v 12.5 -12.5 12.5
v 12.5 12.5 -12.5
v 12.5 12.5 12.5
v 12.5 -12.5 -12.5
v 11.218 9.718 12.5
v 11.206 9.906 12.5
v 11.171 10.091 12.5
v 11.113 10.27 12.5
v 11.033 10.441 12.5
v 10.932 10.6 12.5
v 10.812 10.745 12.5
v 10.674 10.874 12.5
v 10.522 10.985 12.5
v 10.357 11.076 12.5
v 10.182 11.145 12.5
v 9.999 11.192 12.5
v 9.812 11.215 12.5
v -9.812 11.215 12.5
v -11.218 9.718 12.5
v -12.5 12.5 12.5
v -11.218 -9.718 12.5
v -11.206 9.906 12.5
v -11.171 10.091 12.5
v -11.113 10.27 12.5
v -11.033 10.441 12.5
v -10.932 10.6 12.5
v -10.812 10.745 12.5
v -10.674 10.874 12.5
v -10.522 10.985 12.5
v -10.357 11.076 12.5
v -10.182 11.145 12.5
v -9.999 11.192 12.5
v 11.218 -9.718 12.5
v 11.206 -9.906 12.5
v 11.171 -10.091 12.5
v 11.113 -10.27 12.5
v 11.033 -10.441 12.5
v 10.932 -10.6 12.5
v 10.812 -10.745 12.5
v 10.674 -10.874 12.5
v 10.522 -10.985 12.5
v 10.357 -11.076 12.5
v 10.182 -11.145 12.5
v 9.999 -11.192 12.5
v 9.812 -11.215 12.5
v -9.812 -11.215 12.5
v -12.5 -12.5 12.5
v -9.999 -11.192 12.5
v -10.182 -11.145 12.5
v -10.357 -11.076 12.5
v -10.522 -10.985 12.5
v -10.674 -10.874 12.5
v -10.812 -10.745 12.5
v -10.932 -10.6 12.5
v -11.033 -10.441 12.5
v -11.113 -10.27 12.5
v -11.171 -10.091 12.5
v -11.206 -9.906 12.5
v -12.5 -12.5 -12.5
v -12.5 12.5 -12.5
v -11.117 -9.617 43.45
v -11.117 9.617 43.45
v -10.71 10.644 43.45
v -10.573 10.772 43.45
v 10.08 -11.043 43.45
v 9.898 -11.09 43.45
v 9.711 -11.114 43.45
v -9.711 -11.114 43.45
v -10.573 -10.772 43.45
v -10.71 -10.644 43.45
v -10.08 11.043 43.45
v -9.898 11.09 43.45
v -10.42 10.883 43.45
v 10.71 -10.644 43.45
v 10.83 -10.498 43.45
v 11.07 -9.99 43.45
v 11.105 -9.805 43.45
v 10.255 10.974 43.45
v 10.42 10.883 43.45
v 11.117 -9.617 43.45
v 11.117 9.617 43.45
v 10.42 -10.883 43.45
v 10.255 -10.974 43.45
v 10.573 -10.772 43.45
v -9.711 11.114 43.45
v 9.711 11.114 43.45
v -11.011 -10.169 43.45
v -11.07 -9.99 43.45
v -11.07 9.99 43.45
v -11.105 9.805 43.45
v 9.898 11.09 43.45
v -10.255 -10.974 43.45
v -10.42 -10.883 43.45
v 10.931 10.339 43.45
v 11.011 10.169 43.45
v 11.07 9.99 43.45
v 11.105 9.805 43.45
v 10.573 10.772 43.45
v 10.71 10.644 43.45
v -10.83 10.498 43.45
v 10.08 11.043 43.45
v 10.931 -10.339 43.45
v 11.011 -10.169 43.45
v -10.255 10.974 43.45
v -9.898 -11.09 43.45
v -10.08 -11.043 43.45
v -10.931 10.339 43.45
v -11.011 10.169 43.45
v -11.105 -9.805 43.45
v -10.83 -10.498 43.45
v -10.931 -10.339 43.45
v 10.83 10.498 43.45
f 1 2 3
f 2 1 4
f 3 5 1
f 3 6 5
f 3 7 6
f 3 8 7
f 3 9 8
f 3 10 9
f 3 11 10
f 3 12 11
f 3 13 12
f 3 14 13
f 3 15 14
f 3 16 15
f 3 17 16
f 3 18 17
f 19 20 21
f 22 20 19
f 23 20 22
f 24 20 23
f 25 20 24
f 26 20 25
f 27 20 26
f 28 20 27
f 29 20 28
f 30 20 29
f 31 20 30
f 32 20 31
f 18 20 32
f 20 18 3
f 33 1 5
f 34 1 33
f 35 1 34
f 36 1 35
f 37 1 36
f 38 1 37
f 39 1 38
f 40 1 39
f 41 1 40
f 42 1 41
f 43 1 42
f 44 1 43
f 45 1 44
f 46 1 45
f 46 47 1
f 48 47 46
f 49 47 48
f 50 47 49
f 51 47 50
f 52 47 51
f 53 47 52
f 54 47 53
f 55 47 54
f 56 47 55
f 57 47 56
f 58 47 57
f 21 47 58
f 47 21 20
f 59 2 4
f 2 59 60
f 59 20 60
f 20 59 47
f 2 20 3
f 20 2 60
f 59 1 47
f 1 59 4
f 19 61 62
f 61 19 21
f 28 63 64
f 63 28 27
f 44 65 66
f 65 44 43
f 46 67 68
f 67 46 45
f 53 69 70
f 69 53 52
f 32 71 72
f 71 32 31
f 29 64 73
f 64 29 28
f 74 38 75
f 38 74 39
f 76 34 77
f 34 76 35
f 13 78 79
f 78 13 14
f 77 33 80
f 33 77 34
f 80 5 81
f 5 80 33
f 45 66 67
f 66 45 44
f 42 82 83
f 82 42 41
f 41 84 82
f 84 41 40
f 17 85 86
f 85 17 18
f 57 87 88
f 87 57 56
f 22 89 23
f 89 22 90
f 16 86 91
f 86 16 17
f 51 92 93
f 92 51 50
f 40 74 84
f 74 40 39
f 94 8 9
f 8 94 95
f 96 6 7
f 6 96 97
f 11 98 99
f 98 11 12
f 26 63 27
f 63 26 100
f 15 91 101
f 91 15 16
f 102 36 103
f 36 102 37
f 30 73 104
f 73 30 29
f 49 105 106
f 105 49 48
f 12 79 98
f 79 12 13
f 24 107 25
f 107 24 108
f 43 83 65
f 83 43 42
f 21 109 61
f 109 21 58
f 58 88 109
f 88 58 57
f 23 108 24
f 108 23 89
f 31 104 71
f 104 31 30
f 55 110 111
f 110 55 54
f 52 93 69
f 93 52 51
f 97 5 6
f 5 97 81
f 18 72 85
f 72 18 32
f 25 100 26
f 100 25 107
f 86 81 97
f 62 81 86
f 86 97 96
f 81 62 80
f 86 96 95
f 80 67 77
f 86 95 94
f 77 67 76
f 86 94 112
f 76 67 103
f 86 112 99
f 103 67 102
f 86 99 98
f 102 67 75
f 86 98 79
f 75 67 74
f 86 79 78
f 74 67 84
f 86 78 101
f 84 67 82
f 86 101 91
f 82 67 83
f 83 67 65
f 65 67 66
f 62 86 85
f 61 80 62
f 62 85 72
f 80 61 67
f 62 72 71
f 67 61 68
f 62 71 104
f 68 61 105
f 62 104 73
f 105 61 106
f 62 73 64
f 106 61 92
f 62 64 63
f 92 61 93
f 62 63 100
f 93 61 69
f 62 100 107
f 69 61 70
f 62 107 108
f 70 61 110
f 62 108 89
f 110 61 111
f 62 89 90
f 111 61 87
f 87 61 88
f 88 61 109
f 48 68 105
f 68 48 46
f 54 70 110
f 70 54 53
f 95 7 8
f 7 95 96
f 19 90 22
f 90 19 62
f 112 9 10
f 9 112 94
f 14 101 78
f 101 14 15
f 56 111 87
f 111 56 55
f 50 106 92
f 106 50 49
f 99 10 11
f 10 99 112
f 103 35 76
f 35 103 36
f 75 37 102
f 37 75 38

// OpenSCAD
// Square tubing corner connector
// based off design by  David O'Connor  david@lizardstation.com   14 August 2018

// modified to add tapered protrusions, spacers, and a new corner option
// JH Oct 29, 2018

// Copyright Creative Commons Attribution Unported 3.0 (CC-BY-3.0)
//   (https://creativecommons.org/licenses/by/3.0/)

// Connector type
fittingType = 1;// [0:Fit_Check, 1:Plug, 2:L, 3:Union, 4:T, 5:Corner, 6:Sliced Corner, 7:Cross, 8:Mid_Edge, 9:Mid_Face, 10:Interior]
// Center cube dimension (mm)
centerDim = 25;// [6:0.1:40]
// Protrusion center dimension (mm) 
protrusionCenterDim = 22.45; // [6:0.1:30]
// Protrusion end dimension (mm)
protrusionEndDim = 22.2; // ([6:0.1:32] 
// Protrusion length (mm)
protrusionLength = 33;// [6:0.2:60]
// Protrusion Spacer (mm)
protrusionSpacer = 0.0; // [0.0:0.1:20]
// Roundoff radius
roundoffRadius = 1.5;// [0.0:0.5:3.0]
// Add Flat Edge
flatEdge = 0; // [0: No, 1:Yes]
// Flat Edge Depth
edgeDepth = 4; // [0:0:6]

// edgeDepth is not an exact measurement, just a 'more or less" slider and it can vary depening on how much taper used

// The Flat Edge is to help print without using supports, although if the center cube is larger than protrusion or you use a spacer
// then you might need to suppot those little overhangs in the center

bracket(cd=centerDim, pcd=protrusionCenterDim, ped=protrusionEndDim, pl=protrusionLength, ps=protrusionSpacer, r=roundoffRadius, fe=flatEdge, ed=edgeDepth, type=fittingType);

module bracket(cd, pcd, ped,  pl, ps, r, fe, ed, type) {
    fcd = (ps==0 || (pcd+ps>cd)) ? cd : pcd+ps;
    acd = fcd<pcd ? pcd : fcd; // center cube can't be smaller than prutusion, if using spacer then make them the same size for accuracy
    aped = (ped<pcd) ? ped : pcd;  // limit protrusion end so it can't flare larger then rest

    difference()  {
         union() { 
             if (type==0) {
                 test(acd, pcd, aped,  pl, ps, r);
             }
             else {
                fitting(acd, pcd, aped,  pl, ps, r, type);
             }
         };
        if ((fe==1 && type!=0) || type==6) {
            slice(acd, pcd, aped, pl, ps, ed, r, type);
        }
    }
 }
 
 // goes two mm below and above the protrusion end you've set
 module test(cd,pcd,ped,pl,ps,r) {
    cubeHeight = cd * 0.25;
    m = (pl/2 + cubeHeight/2); // this is how much to move the protrusions from center 
    cube([cubeHeight, 5*cd, cd], center=true);
    for (i = [-2:2]) {
        echo(pcd+i,ped+i);
        translate([m, cd*i, 0]) {
            rotate([0, 90, 0]) {
                protrusion(pcd+i, ped + i, pl, ps, r);
            }
        }
    }          
 }
 

 
 module fitting(acd, pcd, ped,  pl, ops, r, type) {
    echo(type);
     // the center cube
    cube([acd, acd, acd], center=true); 
    
    ps = ops - (acd - pcd);
    echo(ps); 
    m = (pl/2 + acd/2 + ps); // this is how much to move the protrusions from center 
    
    // All the parts have at least one protrusion ... this is it
    translate([0, 0, m])
        protrusion(acd, pcd, ped, pl, ps, r);

    // The rest depend on the type selected
    if ((type==3) || (type==4) || (type==7) || (type==8) || (type==9) || (type==10)) 
        translate([0, 0, -m])
            rotate([0, 180, 0])
            protrusion(acd, pcd, ped, pl, ps, r);
    
    if ((type==2) || (type==4) || (type==5) || (type==6) || (type==7) || (type==8) || (type==9) || (type==10)) 
        translate([m, 0, 0])
            rotate([0, 90, 0])
                protrusion(acd, pcd, ped, pl, ps, r);
    
    if ((type==7) || (type==9) || (type==10))
        translate([-m, 0, 0])
            rotate([0, 270, 0])
                protrusion(acd, pcd, ped, pl, ps, r);
        
    if ((type==5) || (type==6) || (type==8) || (type==9) || (type==10))
        translate([0, m, 0])
            rotate([270, 0, 0])
                protrusion(acd, pcd, ped, pl, ps, r);
    
    if(type==10)
        translate([0, -m, 0])
            rotate([90, 0, 0])
                protrusion(acd, pcd, ped, pl, ps, r);          
 }
 
 // slice off part of the connector to aid in printing without supports
 module slice(cd, pcd, ped, pl, ps, ed, r, type) {
     di = (cd + pl*2 + ps*2) * 0.5 * 1.414;
     os = pl + cd;
     cutSize = cd + pl*2 + ps*3;
     pt = pcd - ped;
     
    if (type==6) {
        cc = cd * 1.5;
        rotate([-35.26, 45, 0])
        translate([-0, 0, -cd-1])    
            cube([cc,cc+5,cc],center=true);
    }
    else if ( type==1 || type==3 ) {
        di = (pcd - (pcd * 1.414)) * 0.5;
        rotate([0, 0, -45])
            translate([0, -(pcd - di - ed), 0])
                cube([pcd,pcd,cutSize],center=true);
    }            
    else if (type==7 || type==4 || type==2) {
        rotate([-45, 0, 90])
            translate([0, -(4+di-((pt*0.5) + ps))+ed, 0])    
                cube([cutSize,os,cutSize],center=true);
    }
   else {
        rotate([-35.26, 0, 135])
            translate([0, -(2+di-((pt*0.5) + ps))+ed, 0])    
                cube([cutSize,os,cutSize],center=true);
    }
 }

// Create the protrusion, with rounded corners and taper
module protrusion(acd, pcd, ped, pl, ps, r) {
   $fn = 50;
    minkowski() { 
        linear_extrude (height = pl, scale=(ped/pcd), center=true) // tapered square 
            square([pcd-r*2, pcd-r*2], center=true);
        cylinder(r=r,h=1,center=true);
    };
    
    //if there's a protrusion spacer let's add that while we're here
    if (ps!=0) {
        minkowski() { 
           translate([0, 0, -(pl/2 + ps/2)])
            cube([acd, acd, ps], center=true);
            //sphere(r=1);
        }
    }
}  
